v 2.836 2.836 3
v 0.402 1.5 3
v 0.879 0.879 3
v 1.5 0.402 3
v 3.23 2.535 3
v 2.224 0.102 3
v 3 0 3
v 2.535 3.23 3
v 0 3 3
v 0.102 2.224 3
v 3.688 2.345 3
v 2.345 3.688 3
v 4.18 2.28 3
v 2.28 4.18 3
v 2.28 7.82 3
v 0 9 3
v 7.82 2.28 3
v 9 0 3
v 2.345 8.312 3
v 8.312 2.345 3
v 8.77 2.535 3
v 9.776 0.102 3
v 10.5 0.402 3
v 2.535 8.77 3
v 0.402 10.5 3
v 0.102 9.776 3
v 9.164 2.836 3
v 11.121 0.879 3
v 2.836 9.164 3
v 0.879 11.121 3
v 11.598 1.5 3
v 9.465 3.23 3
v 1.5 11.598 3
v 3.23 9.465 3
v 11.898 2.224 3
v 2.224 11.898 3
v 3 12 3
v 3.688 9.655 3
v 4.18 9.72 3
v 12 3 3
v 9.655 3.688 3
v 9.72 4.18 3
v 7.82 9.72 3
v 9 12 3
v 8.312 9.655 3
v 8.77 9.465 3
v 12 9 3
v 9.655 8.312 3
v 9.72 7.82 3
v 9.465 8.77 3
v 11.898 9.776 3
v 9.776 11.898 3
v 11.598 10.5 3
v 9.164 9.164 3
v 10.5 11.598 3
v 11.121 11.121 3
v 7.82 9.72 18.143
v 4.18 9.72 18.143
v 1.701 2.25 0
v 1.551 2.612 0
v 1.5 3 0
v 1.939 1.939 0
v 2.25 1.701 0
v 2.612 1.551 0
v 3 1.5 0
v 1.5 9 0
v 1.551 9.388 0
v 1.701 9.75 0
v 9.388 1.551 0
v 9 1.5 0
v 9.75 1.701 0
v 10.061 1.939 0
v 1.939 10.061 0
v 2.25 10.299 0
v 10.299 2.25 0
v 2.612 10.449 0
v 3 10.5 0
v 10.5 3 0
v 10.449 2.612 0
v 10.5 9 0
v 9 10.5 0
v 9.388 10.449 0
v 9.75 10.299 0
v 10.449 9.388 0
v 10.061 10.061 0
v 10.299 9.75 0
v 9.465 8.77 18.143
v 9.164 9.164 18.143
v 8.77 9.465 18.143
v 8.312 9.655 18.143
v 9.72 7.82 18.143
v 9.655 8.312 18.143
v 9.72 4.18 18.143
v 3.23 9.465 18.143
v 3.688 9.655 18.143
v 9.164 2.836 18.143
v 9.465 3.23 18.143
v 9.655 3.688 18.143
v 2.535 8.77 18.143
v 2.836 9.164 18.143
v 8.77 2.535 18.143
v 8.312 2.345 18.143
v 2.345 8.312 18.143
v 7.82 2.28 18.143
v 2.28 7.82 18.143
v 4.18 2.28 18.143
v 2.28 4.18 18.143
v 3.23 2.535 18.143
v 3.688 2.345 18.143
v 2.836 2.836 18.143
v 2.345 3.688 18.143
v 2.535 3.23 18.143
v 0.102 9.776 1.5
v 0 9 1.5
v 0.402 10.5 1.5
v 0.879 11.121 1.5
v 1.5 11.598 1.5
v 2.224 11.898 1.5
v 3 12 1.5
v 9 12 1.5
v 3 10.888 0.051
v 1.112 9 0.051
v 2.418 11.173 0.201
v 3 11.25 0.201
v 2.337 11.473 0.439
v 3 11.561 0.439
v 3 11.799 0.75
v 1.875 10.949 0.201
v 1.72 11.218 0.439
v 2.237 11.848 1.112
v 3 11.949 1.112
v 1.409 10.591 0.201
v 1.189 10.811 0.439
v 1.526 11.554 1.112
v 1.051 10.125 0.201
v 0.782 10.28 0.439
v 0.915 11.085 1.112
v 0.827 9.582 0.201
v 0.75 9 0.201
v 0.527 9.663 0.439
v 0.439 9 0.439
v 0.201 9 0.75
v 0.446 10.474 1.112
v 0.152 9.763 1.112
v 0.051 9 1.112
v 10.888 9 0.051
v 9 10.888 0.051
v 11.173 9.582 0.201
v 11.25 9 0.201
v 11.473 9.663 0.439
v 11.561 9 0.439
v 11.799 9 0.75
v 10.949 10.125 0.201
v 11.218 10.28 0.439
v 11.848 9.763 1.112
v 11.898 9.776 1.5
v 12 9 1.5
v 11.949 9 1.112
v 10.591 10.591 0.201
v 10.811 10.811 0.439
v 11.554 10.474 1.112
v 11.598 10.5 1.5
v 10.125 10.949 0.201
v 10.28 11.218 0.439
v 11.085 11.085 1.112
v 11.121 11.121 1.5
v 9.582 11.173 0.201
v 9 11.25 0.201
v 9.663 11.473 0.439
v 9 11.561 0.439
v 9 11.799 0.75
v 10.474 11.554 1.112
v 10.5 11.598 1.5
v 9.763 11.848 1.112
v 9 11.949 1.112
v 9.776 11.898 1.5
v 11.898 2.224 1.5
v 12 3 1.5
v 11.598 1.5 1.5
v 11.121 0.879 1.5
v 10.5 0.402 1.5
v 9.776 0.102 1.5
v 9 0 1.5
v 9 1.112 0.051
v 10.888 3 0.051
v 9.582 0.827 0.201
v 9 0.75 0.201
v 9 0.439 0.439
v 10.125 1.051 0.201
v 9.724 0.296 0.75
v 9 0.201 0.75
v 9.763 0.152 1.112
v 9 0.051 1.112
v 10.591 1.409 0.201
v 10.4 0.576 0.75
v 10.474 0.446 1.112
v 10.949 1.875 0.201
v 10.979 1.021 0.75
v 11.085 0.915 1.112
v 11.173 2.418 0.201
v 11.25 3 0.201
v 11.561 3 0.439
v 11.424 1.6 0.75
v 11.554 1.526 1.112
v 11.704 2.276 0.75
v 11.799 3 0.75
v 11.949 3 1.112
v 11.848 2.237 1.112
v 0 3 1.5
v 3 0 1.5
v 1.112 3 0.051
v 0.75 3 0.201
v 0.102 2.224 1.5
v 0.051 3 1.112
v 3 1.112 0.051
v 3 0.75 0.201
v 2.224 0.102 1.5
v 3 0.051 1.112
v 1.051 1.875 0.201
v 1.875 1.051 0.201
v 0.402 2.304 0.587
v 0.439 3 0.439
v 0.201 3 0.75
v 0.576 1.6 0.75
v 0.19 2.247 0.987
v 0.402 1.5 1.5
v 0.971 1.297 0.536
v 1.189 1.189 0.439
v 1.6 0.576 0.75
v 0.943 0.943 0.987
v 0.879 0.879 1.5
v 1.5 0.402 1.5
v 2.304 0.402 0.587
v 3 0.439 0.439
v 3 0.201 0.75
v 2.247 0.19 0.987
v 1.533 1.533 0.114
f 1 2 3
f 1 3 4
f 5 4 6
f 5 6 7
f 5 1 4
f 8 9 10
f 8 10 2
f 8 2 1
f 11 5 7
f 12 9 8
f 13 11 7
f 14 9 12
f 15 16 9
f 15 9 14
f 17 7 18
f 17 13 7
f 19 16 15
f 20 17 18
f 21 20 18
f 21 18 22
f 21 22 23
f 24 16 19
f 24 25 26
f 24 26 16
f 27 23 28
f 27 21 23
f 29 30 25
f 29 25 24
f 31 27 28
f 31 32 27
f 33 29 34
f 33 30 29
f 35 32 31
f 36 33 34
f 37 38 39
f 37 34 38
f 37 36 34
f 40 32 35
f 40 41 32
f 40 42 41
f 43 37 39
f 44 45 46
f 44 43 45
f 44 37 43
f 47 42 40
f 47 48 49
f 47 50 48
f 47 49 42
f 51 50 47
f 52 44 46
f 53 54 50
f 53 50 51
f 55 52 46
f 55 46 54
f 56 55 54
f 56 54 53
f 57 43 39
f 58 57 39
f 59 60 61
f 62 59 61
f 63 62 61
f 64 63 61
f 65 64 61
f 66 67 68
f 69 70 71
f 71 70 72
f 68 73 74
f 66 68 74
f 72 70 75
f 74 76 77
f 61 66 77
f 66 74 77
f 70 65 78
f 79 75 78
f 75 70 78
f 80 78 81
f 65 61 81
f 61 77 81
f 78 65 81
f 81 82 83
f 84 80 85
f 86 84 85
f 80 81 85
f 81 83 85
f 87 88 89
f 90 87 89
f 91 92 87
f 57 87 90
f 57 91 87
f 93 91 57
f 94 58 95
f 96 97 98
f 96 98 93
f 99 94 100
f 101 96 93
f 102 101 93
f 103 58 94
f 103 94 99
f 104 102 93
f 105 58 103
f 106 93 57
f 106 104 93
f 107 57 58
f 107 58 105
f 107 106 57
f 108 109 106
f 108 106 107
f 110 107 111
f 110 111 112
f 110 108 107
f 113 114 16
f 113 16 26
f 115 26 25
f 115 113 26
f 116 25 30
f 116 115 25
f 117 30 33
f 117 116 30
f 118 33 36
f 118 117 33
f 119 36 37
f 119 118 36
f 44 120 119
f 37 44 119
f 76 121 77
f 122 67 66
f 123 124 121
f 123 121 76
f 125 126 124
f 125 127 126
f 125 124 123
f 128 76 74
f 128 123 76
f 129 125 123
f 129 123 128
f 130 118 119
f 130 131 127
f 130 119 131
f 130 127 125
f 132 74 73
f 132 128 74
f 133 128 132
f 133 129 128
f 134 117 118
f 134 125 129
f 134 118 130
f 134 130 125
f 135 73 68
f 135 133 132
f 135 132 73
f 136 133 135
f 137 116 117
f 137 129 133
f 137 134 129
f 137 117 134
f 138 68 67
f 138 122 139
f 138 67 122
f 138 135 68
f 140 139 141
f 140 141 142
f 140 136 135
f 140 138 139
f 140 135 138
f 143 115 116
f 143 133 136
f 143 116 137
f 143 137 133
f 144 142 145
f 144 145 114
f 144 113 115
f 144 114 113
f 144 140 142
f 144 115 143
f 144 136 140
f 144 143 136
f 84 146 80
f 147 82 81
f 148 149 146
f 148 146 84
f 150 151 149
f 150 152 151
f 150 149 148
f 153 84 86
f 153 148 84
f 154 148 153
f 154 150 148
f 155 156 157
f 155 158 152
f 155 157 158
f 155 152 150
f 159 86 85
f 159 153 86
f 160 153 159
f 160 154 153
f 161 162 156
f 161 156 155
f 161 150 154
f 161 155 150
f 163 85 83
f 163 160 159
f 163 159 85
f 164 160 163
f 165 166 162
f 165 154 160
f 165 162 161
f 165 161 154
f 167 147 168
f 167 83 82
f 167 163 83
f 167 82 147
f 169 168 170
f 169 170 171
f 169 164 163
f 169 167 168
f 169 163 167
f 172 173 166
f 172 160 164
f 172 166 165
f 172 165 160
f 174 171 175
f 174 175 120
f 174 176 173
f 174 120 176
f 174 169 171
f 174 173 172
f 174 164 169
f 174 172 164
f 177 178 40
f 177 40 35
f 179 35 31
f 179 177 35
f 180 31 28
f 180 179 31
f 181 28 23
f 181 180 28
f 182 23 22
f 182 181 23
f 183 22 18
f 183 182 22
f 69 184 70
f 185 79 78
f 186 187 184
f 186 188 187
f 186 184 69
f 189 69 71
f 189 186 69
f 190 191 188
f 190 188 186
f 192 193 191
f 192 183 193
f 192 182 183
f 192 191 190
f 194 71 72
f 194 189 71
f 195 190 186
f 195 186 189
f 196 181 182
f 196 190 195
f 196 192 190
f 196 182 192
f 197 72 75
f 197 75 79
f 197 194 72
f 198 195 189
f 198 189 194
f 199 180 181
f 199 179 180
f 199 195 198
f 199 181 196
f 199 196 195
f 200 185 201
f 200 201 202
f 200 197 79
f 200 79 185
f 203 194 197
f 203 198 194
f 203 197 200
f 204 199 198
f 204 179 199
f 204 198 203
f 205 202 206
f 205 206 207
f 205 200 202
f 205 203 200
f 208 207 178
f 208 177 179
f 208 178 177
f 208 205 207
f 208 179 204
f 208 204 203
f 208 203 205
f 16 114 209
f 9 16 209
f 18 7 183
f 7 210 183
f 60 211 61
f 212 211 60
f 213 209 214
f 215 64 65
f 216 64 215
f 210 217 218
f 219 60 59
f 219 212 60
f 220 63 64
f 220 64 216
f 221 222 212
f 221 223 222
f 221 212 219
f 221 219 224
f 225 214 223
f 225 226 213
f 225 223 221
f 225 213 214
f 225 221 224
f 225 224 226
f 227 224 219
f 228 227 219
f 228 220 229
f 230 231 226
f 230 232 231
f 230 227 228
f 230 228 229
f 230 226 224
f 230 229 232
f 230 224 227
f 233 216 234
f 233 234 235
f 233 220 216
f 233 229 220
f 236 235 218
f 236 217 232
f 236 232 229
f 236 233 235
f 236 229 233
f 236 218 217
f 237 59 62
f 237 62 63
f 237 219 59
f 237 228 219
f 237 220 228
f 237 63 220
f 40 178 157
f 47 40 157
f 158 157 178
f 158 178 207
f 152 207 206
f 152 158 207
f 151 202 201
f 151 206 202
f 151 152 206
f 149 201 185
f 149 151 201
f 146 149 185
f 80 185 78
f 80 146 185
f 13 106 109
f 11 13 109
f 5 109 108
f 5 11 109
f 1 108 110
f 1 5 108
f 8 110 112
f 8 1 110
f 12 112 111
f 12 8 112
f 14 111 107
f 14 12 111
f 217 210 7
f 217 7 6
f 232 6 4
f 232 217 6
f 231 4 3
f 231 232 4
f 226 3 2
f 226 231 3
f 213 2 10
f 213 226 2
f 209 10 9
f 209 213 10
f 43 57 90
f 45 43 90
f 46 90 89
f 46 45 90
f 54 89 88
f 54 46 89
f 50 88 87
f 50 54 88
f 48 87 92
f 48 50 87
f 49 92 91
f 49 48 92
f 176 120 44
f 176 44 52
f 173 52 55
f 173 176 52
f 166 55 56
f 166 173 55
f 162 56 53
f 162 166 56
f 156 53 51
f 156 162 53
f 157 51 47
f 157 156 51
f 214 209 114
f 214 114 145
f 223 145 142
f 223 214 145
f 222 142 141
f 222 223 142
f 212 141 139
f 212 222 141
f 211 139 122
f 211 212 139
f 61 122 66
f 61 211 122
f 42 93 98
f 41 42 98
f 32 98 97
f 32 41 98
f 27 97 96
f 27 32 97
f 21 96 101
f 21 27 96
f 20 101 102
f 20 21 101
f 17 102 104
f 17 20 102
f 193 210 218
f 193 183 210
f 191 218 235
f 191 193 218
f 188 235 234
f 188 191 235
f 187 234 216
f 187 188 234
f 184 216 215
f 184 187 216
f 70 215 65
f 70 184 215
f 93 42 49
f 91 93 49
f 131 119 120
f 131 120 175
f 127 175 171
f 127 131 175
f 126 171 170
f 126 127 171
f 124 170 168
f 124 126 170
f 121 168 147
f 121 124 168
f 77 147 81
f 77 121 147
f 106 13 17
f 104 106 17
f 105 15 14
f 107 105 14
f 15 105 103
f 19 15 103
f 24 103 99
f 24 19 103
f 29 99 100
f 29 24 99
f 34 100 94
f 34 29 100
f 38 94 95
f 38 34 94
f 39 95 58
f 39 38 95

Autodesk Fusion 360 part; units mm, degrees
sketch "Base" plane through (0, 0, 0) normal (0, 0, 1) x (1, 0, 0)
  line L0 (3, 0) -> (9, 0)
  line L1 (12, 3) -> (12, 9)
  line L2 (9, 12) -> (3, 12)
  line L3 (0, 9) -> (0, 3)
  arc A0 (3, 12) -> (0, 9) centre (3, 9) ccw
  arc A1 (12, 9) -> (9, 12) centre (9, 9) ccw
  arc A2 (9, 0) -> (12, 3) centre (9, 3) ccw
  arc A3 (0, 3) -> (3, 0) centre (3, 3) ccw
  point P0 (12, 0)
  point P1 (0, 12)
  dimension "d1" = 12
  dimension "d2" = 12
  dimension "d3" = 3
sketch "Sketch2" plane through (0, 0, 3) normal (0, 0, 1) x (-1, 0, 0)
  arc A0 (0, -3) -> (-3, 0) centre (-3, -3) ccw
  arc A1 (-3, -12) -> (0, -9) centre (-3, -9) ccw
  line L0 (-4.18, -2.28) -> (-7.82, -2.28)
  line L1 (-9.72, -4.18) -> (-9.72, -7.82)
  line L2 (-7.82, -9.72) -> (-4.18, -9.72)
  line L3 (-2.28, -7.82) -> (-2.28, -4.18)
  arc A2 (-4.18, -9.72) -> (-2.28, -7.82) centre (-4.18, -7.82) ccw
  arc A3 (-9.72, -7.82) -> (-7.82, -9.72) centre (-7.82, -7.82) ccw
  arc A4 (-7.82, -2.28) -> (-9.72, -4.18) centre (-7.82, -4.18) ccw
  arc A5 (-2.28, -4.18) -> (-4.18, -2.28) centre (-4.18, -4.18) ccw
  point P0 (-2.28, -2.28)
  point P1 (-9.72, -2.28)
  point P2 (-2.28, -9.72)
  dimension "d18" = 7.44
  dimension "d19" = 7.44
  dimension "d20" = 1.9
extrude "Extrude3" add sketch "Base" along normal blind 3
extrude "Extrude4" add sketch "Sketch2" along normal blind 15.143
fillet "Fillet2" radius 1.5 8 edges at (12, 6, 0) (11.1213, 11.1213, 0) (6, 12, 0) (0.8787, 11.1213, 0) (0, 6, 0) (0.8787, 0.8787, 0) (6, 0, 0) (11.1213, 0.8787, 0)
